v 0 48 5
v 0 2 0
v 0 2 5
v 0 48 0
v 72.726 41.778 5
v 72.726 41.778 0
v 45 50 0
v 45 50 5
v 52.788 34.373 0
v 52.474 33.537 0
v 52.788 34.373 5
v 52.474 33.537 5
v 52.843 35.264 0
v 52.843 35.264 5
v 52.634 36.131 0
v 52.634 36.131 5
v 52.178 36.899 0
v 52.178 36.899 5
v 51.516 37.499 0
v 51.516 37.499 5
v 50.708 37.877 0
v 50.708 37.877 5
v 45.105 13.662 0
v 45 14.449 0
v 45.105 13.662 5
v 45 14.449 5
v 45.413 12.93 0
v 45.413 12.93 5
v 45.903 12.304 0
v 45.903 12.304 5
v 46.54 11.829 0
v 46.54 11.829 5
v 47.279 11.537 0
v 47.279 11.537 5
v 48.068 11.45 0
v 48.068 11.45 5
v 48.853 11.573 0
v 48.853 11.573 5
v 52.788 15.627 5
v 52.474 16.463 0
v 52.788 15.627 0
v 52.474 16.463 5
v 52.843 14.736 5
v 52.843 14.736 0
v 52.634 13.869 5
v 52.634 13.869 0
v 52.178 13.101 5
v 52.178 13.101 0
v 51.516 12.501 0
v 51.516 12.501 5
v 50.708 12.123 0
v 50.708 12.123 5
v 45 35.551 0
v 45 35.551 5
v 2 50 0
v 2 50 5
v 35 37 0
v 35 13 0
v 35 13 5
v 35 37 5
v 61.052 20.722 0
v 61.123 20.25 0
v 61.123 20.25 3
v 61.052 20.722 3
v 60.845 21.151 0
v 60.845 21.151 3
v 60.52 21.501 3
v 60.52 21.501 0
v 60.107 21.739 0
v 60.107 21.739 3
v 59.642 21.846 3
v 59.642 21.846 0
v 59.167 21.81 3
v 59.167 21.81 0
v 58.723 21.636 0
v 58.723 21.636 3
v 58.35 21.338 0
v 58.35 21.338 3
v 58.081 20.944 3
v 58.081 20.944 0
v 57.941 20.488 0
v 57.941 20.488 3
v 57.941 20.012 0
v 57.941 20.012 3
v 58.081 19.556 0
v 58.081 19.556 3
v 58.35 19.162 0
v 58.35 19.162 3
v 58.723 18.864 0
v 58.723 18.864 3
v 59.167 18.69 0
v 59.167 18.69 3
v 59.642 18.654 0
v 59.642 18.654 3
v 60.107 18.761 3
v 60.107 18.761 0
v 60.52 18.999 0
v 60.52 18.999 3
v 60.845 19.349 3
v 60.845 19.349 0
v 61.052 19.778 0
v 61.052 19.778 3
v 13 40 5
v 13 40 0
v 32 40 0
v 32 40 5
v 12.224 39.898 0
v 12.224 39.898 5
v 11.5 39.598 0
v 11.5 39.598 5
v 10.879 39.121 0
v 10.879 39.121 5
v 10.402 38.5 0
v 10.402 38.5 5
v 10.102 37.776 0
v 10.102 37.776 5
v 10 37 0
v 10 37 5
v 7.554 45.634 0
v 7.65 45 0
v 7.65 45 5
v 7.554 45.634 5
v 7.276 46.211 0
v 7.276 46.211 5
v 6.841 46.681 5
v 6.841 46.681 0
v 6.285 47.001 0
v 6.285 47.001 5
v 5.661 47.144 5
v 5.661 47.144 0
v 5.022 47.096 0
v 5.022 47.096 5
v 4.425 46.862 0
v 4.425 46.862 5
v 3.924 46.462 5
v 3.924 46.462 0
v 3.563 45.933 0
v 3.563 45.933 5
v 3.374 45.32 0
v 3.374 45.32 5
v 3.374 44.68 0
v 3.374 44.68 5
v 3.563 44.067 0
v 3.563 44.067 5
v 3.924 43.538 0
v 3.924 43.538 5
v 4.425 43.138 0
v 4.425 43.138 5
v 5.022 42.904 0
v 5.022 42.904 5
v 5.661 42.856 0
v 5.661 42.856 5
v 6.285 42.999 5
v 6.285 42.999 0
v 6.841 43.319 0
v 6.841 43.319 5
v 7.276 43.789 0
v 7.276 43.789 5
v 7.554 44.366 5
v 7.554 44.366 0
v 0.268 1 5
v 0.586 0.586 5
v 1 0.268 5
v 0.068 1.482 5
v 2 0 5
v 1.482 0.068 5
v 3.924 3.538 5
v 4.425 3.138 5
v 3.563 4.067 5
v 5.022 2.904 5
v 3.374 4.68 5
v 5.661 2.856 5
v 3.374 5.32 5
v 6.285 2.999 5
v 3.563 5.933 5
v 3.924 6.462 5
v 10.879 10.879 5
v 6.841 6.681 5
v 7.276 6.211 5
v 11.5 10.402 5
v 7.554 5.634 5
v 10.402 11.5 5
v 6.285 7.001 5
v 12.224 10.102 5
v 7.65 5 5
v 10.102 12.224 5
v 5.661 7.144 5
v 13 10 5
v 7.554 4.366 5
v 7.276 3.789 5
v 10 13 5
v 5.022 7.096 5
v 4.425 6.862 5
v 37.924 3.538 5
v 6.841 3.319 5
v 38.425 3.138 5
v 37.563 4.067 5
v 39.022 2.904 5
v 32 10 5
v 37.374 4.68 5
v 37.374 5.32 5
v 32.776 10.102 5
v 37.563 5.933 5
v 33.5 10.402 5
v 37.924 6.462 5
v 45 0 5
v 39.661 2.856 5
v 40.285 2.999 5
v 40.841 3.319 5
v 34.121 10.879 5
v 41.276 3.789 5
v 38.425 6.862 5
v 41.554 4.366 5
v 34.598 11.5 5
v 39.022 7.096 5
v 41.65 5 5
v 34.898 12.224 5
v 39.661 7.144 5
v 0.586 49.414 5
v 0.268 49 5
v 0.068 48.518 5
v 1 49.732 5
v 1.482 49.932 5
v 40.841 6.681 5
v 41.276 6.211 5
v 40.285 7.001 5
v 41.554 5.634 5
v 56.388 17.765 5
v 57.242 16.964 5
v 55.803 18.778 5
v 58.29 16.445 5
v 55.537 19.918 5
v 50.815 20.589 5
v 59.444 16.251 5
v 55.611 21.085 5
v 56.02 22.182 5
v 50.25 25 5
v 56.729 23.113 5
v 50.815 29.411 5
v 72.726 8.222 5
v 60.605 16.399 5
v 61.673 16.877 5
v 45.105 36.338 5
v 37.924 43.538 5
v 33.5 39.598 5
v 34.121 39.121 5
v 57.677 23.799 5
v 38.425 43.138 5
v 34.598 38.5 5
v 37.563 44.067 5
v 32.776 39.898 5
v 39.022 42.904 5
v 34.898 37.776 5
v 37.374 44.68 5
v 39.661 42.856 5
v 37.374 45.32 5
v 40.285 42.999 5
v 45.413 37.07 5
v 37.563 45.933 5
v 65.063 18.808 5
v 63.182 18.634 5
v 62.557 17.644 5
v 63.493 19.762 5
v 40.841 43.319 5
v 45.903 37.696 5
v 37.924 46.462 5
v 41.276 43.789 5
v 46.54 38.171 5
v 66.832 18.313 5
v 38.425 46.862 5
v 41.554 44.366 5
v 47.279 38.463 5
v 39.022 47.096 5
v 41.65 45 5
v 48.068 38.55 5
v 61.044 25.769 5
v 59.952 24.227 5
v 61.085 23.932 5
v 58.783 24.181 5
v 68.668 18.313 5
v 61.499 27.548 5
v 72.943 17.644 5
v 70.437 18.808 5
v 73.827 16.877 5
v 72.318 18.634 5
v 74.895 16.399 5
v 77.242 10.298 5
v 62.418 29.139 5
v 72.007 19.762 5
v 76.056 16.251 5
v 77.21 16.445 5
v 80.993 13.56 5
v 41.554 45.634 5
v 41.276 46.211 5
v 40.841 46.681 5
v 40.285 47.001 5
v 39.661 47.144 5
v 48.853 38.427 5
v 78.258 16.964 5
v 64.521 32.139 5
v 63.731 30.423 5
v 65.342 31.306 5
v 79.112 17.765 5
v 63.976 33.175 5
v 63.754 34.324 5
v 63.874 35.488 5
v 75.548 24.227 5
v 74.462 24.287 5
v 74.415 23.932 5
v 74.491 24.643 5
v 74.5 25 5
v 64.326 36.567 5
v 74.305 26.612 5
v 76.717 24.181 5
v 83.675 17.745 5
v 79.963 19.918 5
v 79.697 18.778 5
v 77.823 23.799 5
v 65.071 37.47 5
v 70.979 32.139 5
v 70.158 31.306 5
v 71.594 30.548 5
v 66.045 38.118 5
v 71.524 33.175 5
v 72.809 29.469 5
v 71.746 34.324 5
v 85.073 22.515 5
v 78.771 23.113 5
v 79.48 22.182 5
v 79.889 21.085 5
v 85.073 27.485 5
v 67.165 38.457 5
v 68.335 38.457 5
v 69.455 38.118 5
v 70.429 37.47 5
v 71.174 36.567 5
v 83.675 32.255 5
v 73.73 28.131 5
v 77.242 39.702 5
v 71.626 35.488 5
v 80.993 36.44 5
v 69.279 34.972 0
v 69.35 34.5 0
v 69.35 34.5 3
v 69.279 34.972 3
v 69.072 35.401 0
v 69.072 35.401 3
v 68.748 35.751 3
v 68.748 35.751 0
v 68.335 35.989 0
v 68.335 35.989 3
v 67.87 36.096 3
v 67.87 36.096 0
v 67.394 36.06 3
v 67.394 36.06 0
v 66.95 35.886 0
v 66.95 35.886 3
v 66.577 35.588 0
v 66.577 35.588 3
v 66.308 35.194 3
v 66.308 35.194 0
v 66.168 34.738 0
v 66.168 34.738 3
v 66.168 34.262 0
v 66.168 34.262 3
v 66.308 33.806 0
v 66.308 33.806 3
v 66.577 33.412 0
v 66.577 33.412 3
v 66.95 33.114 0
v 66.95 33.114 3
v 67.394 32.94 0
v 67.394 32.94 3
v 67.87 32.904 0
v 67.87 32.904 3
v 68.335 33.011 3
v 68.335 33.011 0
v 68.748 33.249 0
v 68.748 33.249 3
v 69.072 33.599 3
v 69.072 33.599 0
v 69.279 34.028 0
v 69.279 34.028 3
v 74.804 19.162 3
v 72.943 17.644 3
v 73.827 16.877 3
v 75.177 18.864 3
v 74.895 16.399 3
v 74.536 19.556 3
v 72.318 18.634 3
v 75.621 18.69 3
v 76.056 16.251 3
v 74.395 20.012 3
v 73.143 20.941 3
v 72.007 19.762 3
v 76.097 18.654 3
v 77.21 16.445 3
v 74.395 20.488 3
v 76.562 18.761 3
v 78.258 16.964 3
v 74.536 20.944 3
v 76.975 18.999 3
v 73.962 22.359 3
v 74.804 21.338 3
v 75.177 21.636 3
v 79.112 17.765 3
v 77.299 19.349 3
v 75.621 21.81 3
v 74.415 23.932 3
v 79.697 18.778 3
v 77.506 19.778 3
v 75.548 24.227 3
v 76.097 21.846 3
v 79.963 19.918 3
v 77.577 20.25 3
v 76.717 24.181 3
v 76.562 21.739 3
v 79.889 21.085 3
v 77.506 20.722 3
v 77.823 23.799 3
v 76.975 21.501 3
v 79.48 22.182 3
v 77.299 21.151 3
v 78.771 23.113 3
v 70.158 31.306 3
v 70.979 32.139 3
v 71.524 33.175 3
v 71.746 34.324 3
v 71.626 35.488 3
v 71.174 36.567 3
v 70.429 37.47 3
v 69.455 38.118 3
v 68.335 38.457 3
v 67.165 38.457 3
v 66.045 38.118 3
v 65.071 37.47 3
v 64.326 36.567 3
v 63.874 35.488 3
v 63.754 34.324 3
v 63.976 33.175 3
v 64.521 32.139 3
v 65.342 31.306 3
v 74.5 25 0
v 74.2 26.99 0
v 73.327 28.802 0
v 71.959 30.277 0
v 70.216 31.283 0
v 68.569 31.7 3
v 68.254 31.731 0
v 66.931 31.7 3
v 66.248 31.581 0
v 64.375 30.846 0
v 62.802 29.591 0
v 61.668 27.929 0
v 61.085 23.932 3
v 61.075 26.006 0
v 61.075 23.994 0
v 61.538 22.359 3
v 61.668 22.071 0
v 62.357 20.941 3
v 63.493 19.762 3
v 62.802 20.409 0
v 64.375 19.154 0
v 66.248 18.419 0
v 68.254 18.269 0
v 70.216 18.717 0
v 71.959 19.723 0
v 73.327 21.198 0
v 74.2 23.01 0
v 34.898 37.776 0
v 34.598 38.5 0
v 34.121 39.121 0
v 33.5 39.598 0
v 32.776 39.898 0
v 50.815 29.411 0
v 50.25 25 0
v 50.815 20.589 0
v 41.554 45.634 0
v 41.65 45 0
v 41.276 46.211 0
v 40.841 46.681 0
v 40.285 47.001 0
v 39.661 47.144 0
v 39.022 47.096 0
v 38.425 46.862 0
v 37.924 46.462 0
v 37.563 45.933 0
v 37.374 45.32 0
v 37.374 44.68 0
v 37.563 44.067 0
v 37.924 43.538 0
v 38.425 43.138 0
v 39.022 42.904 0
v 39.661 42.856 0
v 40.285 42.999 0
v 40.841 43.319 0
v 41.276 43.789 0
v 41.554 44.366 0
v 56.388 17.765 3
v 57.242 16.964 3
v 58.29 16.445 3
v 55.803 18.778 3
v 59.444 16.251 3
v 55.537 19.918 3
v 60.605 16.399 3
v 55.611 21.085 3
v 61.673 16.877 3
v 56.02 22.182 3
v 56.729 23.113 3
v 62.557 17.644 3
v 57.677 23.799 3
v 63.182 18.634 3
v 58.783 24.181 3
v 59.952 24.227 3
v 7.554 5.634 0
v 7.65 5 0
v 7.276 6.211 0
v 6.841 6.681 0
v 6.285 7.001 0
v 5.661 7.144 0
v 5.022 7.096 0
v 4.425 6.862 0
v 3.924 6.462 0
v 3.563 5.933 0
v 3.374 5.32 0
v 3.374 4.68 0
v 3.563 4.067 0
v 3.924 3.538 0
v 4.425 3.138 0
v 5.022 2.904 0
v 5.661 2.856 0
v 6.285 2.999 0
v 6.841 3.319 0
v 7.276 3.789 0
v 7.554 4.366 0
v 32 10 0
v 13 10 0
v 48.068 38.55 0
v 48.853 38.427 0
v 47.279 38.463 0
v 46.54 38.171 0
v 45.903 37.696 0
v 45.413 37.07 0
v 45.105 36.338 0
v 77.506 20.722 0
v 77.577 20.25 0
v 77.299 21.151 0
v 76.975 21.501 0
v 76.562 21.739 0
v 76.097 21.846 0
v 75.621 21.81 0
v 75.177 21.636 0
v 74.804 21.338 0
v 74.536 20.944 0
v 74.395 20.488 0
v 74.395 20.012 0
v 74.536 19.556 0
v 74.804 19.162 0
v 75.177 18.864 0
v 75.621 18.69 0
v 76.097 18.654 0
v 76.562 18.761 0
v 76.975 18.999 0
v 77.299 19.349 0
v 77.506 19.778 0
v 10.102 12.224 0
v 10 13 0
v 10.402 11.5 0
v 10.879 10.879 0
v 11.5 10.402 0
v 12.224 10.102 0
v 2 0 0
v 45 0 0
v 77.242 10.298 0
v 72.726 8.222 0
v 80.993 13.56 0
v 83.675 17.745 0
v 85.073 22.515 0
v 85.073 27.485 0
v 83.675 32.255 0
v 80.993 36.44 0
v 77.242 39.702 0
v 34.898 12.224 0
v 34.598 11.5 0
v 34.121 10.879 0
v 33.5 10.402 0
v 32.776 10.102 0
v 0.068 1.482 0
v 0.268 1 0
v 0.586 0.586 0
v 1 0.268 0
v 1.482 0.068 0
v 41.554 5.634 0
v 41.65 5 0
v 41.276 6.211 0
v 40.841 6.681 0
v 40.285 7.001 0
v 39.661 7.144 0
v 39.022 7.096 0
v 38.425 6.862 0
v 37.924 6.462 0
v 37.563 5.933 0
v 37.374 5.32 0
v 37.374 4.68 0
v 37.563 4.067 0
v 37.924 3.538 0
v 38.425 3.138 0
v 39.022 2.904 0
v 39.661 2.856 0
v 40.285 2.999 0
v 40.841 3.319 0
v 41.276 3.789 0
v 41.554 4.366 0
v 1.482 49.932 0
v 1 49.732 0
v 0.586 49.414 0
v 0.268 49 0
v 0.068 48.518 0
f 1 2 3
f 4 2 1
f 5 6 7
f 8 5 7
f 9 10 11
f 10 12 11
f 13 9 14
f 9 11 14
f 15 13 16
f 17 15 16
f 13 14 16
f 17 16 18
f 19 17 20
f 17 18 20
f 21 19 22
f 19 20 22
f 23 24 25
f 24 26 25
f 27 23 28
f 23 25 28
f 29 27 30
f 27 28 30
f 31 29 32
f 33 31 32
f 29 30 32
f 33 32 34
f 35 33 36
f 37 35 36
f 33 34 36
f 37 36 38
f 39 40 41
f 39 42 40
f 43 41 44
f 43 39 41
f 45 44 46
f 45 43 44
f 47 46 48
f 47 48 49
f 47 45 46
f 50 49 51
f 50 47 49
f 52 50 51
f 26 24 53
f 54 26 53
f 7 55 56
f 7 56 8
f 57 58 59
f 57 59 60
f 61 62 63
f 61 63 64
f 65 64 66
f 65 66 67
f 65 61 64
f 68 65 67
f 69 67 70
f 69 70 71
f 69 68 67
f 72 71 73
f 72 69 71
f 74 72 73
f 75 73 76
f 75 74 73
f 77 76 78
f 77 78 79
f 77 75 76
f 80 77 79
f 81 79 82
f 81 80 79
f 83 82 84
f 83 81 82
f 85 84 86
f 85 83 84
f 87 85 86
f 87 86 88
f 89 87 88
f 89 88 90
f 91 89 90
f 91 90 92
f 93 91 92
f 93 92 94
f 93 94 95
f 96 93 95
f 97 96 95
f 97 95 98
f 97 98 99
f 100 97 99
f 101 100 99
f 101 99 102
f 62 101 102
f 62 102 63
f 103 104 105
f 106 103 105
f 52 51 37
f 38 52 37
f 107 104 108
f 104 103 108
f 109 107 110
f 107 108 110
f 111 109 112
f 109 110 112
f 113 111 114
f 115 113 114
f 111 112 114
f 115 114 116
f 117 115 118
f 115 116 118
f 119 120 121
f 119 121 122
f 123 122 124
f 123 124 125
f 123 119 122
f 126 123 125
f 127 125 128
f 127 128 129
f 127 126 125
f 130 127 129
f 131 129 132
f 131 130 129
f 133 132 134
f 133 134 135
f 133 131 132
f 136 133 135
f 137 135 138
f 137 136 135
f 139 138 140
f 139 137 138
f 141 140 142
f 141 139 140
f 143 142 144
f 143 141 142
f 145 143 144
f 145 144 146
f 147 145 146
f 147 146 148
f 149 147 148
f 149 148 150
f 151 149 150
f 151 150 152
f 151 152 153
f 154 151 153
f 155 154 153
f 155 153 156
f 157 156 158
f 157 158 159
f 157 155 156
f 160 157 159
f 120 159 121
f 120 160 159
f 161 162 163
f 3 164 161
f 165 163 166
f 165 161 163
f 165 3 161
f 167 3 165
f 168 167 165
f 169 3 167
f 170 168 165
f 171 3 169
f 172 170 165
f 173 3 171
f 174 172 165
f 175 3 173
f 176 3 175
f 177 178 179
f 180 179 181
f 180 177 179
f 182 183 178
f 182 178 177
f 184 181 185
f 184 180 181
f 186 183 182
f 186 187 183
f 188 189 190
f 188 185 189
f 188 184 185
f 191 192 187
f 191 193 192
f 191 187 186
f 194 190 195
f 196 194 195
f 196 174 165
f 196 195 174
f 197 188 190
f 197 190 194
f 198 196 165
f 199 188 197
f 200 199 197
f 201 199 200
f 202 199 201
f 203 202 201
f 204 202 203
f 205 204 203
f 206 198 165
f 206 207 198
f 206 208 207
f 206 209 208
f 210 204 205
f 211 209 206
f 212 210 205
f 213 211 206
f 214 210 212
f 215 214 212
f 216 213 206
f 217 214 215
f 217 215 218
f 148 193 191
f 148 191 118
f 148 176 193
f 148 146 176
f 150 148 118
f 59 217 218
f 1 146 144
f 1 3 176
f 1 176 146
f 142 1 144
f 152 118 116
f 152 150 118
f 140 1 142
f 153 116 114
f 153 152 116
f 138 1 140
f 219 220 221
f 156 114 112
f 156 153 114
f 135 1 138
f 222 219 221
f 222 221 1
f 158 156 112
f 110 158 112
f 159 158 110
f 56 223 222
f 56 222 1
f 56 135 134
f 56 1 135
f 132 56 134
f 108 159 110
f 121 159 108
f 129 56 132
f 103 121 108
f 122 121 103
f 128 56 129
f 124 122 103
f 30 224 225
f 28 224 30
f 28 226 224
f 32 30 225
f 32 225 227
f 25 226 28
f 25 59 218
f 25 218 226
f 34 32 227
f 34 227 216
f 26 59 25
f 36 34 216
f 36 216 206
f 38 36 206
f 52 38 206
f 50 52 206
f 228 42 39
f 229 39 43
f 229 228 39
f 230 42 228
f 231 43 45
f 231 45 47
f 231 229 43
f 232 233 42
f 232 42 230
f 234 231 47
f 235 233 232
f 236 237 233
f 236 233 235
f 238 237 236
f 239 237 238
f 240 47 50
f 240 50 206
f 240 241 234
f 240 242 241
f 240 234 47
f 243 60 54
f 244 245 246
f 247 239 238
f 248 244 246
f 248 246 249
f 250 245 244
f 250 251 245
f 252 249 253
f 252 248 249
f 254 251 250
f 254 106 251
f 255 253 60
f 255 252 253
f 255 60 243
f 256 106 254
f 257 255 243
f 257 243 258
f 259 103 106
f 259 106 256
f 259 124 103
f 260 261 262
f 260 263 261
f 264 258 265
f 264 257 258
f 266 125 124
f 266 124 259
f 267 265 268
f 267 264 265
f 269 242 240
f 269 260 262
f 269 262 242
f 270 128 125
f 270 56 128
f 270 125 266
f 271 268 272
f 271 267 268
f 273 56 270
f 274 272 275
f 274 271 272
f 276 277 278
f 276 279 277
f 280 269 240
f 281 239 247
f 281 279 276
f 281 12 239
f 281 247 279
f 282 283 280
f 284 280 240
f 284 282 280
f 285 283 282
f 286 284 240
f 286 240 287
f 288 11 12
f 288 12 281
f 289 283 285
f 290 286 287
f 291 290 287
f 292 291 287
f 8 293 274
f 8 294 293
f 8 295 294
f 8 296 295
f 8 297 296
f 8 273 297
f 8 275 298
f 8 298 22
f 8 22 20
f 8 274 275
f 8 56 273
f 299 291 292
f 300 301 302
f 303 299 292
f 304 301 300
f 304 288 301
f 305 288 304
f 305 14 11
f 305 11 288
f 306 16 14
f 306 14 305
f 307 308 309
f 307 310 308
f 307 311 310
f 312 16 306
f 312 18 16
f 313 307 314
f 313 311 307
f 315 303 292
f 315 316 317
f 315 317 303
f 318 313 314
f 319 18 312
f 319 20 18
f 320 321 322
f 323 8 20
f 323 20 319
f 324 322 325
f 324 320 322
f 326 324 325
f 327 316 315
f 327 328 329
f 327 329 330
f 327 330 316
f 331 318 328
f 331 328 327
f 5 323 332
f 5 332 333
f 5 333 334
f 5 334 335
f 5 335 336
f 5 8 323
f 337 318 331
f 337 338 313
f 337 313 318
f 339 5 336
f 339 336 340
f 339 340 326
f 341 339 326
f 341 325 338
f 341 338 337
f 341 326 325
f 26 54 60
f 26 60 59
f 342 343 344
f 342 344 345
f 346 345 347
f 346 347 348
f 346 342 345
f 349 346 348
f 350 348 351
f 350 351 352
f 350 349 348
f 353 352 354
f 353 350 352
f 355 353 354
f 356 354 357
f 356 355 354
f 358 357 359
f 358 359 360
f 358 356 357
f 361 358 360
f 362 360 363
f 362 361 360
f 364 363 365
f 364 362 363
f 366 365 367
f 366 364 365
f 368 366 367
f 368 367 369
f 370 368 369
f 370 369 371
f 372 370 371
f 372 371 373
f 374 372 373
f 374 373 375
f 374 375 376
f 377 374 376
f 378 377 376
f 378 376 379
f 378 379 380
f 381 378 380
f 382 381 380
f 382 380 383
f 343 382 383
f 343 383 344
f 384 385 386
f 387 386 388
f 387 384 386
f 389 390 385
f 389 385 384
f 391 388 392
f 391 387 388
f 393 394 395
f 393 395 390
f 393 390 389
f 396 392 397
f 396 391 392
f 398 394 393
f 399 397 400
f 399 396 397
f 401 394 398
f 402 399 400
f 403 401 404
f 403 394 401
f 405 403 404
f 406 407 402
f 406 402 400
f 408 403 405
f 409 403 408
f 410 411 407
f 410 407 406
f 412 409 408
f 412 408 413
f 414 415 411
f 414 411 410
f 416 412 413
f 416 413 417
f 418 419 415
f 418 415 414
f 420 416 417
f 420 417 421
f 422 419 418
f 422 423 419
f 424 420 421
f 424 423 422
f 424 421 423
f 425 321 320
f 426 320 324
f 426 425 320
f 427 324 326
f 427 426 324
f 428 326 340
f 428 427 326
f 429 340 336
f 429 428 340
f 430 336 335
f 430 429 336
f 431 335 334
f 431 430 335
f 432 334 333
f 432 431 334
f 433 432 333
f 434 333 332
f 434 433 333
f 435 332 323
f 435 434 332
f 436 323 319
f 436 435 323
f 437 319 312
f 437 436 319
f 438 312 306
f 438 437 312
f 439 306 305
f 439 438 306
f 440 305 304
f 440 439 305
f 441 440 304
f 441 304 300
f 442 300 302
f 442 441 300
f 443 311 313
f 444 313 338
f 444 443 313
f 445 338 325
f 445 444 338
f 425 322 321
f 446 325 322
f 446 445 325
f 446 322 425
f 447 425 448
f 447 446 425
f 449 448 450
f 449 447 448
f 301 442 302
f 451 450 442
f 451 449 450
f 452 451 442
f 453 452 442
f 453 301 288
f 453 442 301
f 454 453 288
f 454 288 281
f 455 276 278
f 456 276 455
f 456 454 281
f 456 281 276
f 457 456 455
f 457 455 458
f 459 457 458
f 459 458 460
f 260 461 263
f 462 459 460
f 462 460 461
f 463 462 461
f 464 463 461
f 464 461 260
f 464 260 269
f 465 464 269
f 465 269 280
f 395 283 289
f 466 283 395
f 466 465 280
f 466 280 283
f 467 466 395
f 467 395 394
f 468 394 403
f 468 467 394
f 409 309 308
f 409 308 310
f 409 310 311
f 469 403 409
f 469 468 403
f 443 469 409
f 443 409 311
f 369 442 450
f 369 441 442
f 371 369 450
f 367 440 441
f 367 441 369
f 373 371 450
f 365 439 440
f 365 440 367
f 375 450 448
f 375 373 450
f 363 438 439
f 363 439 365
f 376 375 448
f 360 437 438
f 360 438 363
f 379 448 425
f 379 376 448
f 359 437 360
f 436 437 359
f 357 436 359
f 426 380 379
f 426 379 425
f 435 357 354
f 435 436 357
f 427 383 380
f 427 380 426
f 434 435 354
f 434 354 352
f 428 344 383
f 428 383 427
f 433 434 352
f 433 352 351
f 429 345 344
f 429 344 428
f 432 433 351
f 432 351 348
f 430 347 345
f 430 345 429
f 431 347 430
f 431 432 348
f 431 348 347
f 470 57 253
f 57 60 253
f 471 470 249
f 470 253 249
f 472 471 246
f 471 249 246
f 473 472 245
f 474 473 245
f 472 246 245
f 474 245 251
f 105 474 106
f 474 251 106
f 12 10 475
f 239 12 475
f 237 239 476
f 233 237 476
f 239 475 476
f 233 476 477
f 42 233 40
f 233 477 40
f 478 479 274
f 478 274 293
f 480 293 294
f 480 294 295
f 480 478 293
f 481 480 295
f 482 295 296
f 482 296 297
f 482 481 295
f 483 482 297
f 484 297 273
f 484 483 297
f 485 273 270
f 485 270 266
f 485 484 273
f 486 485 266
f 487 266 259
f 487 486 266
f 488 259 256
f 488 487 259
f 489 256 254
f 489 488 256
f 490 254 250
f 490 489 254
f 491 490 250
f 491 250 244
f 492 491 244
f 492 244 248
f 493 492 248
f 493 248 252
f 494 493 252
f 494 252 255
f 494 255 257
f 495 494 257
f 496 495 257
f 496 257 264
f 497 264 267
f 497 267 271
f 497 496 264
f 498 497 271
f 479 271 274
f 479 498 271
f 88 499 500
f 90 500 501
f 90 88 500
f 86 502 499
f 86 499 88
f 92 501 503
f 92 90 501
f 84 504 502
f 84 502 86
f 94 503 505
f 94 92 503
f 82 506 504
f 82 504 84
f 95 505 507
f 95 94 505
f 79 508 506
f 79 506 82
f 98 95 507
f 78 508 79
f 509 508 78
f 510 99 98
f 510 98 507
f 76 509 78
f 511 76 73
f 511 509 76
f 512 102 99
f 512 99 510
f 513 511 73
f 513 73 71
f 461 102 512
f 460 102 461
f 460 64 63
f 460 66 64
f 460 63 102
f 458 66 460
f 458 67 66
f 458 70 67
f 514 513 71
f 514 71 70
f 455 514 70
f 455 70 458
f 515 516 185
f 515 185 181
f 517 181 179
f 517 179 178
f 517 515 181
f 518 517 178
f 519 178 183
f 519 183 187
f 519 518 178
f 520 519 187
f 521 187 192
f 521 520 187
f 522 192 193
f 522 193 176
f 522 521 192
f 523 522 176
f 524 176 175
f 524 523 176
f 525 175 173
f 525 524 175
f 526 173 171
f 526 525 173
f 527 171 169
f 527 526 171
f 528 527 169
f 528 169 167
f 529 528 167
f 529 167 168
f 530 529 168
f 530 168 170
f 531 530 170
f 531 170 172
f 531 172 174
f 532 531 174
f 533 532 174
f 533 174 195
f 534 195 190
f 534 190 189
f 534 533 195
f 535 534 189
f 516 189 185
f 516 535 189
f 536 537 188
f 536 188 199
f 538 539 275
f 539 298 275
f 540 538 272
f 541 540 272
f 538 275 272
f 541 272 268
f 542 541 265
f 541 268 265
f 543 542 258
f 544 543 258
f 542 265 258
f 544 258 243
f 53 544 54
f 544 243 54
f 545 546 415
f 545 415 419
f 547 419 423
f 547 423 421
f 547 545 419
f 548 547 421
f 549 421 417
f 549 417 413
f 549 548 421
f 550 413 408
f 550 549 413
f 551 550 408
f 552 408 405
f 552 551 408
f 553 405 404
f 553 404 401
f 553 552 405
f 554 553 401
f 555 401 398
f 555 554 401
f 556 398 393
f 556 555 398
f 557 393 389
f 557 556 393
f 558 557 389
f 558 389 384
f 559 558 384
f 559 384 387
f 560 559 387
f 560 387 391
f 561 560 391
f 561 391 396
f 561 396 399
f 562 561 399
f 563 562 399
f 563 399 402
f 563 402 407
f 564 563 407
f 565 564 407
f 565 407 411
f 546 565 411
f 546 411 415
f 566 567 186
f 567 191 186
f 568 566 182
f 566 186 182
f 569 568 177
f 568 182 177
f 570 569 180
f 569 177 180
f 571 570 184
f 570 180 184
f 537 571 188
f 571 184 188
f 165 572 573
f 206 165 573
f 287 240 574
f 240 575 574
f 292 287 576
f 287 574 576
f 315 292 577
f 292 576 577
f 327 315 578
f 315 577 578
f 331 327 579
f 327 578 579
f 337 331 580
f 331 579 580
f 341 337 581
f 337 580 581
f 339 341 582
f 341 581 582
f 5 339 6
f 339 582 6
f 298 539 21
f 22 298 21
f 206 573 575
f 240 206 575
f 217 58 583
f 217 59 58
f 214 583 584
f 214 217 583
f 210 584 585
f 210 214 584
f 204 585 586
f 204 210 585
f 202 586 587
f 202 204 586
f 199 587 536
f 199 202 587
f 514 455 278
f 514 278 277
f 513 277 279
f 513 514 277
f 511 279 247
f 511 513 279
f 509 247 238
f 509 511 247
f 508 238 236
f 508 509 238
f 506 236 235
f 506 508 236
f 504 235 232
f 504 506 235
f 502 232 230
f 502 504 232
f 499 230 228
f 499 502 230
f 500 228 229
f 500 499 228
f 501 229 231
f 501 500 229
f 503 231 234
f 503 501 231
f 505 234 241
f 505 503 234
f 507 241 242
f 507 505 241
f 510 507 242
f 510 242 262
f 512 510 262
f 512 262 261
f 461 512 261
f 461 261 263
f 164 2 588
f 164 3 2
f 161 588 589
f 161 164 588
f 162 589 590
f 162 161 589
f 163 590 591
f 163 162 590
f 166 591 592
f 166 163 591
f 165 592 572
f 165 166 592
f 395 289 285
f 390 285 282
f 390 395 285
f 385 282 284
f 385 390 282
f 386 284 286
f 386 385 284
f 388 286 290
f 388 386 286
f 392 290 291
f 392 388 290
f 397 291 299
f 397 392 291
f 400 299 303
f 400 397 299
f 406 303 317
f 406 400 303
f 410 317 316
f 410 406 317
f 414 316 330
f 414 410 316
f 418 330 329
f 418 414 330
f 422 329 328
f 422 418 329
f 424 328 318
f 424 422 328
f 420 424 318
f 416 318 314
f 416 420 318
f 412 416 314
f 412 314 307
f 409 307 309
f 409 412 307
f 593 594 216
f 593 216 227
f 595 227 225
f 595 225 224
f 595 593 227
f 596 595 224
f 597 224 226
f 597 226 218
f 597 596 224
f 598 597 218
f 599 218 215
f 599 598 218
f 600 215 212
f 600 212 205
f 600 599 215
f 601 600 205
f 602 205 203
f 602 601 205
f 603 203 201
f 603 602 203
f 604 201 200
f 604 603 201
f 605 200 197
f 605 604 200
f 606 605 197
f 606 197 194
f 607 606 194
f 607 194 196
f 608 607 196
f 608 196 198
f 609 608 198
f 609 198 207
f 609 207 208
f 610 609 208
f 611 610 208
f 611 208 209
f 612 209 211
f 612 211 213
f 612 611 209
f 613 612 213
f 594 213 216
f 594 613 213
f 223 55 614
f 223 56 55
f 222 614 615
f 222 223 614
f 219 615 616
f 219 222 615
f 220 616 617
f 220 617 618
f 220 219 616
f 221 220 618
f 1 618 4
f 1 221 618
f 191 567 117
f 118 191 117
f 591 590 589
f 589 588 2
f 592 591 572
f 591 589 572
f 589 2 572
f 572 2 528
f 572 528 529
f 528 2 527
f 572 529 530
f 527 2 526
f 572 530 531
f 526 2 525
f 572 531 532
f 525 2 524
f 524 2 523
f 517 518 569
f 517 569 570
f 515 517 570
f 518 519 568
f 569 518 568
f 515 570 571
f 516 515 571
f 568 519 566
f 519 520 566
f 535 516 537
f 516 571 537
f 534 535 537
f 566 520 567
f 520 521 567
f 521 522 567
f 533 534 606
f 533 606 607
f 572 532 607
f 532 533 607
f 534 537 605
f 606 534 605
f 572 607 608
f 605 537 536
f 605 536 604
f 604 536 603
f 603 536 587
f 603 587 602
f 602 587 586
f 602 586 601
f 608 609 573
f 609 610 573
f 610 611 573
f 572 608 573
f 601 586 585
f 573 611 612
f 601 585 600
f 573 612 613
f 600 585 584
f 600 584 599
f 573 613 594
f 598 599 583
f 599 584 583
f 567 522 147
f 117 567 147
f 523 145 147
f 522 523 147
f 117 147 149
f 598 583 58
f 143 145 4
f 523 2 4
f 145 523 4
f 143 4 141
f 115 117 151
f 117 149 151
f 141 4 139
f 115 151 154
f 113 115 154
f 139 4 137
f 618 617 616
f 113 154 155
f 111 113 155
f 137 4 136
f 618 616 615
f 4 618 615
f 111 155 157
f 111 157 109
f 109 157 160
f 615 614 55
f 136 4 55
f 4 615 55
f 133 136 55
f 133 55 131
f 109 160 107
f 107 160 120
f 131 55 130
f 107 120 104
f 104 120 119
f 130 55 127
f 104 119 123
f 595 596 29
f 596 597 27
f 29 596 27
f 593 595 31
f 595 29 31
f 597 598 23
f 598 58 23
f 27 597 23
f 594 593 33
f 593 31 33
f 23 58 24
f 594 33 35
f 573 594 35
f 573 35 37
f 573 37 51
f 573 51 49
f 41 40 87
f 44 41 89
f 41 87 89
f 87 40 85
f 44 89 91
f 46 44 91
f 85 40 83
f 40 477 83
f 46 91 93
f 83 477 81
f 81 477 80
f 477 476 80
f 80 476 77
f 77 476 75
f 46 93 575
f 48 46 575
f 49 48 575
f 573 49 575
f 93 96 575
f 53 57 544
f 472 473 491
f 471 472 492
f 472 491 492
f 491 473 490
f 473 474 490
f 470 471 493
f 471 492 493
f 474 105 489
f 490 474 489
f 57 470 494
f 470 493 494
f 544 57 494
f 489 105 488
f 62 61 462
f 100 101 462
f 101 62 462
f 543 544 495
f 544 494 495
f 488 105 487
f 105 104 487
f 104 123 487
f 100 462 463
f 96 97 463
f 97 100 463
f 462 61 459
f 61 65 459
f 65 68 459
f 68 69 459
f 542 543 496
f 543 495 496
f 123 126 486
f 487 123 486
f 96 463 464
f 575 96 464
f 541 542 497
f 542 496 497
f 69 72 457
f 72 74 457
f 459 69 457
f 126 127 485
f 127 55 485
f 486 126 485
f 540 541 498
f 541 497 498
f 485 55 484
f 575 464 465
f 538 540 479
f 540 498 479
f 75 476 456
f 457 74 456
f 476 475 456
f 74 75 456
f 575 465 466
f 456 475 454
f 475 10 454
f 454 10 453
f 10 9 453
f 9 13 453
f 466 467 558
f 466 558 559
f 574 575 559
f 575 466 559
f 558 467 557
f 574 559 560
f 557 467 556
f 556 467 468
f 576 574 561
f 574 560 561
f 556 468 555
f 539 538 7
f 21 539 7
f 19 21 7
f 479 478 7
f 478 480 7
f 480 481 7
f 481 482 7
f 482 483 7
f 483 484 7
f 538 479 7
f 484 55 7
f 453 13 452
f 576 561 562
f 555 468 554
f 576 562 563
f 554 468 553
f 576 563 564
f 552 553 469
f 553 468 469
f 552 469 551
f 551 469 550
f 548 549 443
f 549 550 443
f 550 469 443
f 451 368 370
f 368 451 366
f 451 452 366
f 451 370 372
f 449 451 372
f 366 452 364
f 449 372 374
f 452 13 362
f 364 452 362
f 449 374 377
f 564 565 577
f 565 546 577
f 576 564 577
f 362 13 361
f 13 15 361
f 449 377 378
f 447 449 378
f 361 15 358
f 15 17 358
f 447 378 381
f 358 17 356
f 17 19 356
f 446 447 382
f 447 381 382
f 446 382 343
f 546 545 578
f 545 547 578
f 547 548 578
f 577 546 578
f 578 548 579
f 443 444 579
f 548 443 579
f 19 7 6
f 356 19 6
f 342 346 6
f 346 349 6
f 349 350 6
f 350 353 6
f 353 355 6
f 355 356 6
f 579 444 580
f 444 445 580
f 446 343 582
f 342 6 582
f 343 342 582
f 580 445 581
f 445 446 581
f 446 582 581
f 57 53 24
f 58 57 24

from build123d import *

# Parameters (mm, degrees)
SKETCH_1_W          = 45
SKETCH_1_H          = 50
SKETCH_1_R          = 2.15
SKETCH_1_W_2        = 25
SKETCH_1_H_2        = 30
SKETCH_1_R_2        = 17.5
SKETCH_1_R_3        = 6.75
SKETCH_1_R_4        = 1.6
EXTRUDE_1_DEPTH     = 5
CUT_EXTRUDE_START   = -2
SKETCH_2_R          = 4
SKETCH_2_R_2        = 1.6
SKETCH_2_R_3        = 6.75
CUT_EXTRUDE_1_DEPTH = 2
FILLET_2_R          = 3
FILLET_3_R          = 2


with BuildPart() as part:
    # ｽｹｯﾁ1 → ﾎﾞｽ - 押し出し1 (new body)
    # profile 1 of 4: a face of its own
    with BuildSketch(Plane.XY):
        with Locations((22.5, 25)):
            Rectangle(SKETCH_1_W, SKETCH_1_H)
        with Locations((39.5, 45)):
            Circle(SKETCH_1_R, mode=Mode.SUBTRACT)
        with Locations((5.5, 45)):
            Circle(SKETCH_1_R, mode=Mode.SUBTRACT)
        with Locations((5.5, 5)):
            Circle(SKETCH_1_R, mode=Mode.SUBTRACT)
        with Locations((39.5, 5)):
            Circle(SKETCH_1_R, mode=Mode.SUBTRACT)
        with Locations((22.5, 25)):
            Rectangle(SKETCH_1_W_2, SKETCH_1_H_2, mode=Mode.SUBTRACT)
    # profile 2 of 4: a face of its own
    with BuildSketch(Plane.XY):
        with Locations((67.75, 25)):
            Circle(SKETCH_1_R_2)
        with Locations((67.75, 25)):
            Circle(SKETCH_1_R_3, mode=Mode.SUBTRACT)
        with Locations((67.75, 34.5)):
            Circle(SKETCH_1_R_4, mode=Mode.SUBTRACT)
        with Locations((75.977241336, 20.25)):
            Circle(SKETCH_1_R_4, mode=Mode.SUBTRACT)
        with Locations((59.522758664, 20.25)):
            Circle(SKETCH_1_R_4, mode=Mode.SUBTRACT)
    # profile 3 of 4: a face of its own
    with BuildSketch(Plane.XY):
        with BuildLine():
            Line((72.725574461, 41.77777276), (45, 50))
            Line((45, 50), (45, 39.569533304))
            Line((45, 39.569533304), (54.723538773, 36.685944887))
            ThreePointArc((54.723538773, 36.685944887), (62.987031157, 41.839362452), (72.725574461, 41.77777276))
        make_face()
    # profile 4 of 4: a face of its own
    with BuildSketch(Plane.XY):
        with BuildLine():
            Line((45, 10.430466696), (45, 0))
            Line((45, 0), (72.725574461, 8.22222724))
            ThreePointArc((72.725574461, 8.22222724), (62.987031157, 8.160637548), (54.723538773, 13.314055113))
            Line((54.723538773, 13.314055113), (45, 10.430466696))
        make_face()
    extrude(amount=EXTRUDE_1_DEPTH)

    # ｽｹｯﾁ2 → ｶｯﾄ - 押し出し1 (cut)
    # profile 1 of 6: a face of its own
    with BuildSketch(Plane.XY.offset(5).offset(CUT_EXTRUDE_START)):
        with Locations((67.75, 34.5)):
            Circle(SKETCH_2_R)
        with Locations((67.75, 34.5)):
            Circle(SKETCH_2_R_2, mode=Mode.SUBTRACT)
    # profile 2 of 6: a face of its own
    with BuildSketch(Plane.XY.offset(5).offset(CUT_EXTRUDE_START)):
        with Locations(Location((67.75, 25, 0), (0, 0, 189.100972034))):
            Circle(SKETCH_2_R_3)
    # profile 3 of 6: a face of its own
    with BuildSketch(Plane.XY.offset(5).offset(CUT_EXTRUDE_START)):
        with Locations(Location((67.75, 25, 0), (0, 0, 189.100972034))):
            Circle(SKETCH_2_R_3)
    # profile 4 of 6: a face of its own
    with BuildSketch(Plane.XY.offset(5).offset(CUT_EXTRUDE_START)):
        with Locations((59.522758664, 20.25)):
            Circle(SKETCH_2_R)
        with Locations((59.522758664, 20.25)):
            Circle(SKETCH_2_R_2, mode=Mode.SUBTRACT)
    # profile 5 of 6: a face of its own
    with BuildSketch(Plane.XY.offset(5).offset(CUT_EXTRUDE_START)):
        with Locations(Location((67.75, 25, 0), (0, 0, 189.100972034))):
            Circle(SKETCH_2_R_3)
    # profile 6 of 6: a face of its own
    with BuildSketch(Plane.XY.offset(5).offset(CUT_EXTRUDE_START)):
        with Locations((75.977241336, 20.25)):
            Circle(SKETCH_2_R)
        with Locations((75.977241336, 20.25)):
            Circle(SKETCH_2_R_2, mode=Mode.SUBTRACT)
    extrude(amount=CUT_EXTRUDE_1_DEPTH, mode=Mode.SUBTRACT)

    # ﾌｨﾚｯﾄ2
    fillet_2_edges = [part.edges().sort_by_distance(p)[0] for p in [
        (35, 40, 2.5),
        (10, 40, 2.5),
        (10, 10, 2.5),
        (35, 10, 2.5),
        (45, 39.569533304, 2.5),
        (45, 10.430466696, 2.5),
        (54.723538773, 13.314055113, 2.5),
        (54.723538773, 36.685944887, 2.5),
    ]]
    fillet(fillet_2_edges, radius=FILLET_2_R)

    # ﾌｨﾚｯﾄ3
    fillet_3_edges = [part.edges().sort_by_distance(p)[0] for p in [
        (0, 0, 2.5),
        (0, 50, 2.5),
    ]]
    fillet(fillet_3_edges, radius=FILLET_3_R)


solid = part.part
